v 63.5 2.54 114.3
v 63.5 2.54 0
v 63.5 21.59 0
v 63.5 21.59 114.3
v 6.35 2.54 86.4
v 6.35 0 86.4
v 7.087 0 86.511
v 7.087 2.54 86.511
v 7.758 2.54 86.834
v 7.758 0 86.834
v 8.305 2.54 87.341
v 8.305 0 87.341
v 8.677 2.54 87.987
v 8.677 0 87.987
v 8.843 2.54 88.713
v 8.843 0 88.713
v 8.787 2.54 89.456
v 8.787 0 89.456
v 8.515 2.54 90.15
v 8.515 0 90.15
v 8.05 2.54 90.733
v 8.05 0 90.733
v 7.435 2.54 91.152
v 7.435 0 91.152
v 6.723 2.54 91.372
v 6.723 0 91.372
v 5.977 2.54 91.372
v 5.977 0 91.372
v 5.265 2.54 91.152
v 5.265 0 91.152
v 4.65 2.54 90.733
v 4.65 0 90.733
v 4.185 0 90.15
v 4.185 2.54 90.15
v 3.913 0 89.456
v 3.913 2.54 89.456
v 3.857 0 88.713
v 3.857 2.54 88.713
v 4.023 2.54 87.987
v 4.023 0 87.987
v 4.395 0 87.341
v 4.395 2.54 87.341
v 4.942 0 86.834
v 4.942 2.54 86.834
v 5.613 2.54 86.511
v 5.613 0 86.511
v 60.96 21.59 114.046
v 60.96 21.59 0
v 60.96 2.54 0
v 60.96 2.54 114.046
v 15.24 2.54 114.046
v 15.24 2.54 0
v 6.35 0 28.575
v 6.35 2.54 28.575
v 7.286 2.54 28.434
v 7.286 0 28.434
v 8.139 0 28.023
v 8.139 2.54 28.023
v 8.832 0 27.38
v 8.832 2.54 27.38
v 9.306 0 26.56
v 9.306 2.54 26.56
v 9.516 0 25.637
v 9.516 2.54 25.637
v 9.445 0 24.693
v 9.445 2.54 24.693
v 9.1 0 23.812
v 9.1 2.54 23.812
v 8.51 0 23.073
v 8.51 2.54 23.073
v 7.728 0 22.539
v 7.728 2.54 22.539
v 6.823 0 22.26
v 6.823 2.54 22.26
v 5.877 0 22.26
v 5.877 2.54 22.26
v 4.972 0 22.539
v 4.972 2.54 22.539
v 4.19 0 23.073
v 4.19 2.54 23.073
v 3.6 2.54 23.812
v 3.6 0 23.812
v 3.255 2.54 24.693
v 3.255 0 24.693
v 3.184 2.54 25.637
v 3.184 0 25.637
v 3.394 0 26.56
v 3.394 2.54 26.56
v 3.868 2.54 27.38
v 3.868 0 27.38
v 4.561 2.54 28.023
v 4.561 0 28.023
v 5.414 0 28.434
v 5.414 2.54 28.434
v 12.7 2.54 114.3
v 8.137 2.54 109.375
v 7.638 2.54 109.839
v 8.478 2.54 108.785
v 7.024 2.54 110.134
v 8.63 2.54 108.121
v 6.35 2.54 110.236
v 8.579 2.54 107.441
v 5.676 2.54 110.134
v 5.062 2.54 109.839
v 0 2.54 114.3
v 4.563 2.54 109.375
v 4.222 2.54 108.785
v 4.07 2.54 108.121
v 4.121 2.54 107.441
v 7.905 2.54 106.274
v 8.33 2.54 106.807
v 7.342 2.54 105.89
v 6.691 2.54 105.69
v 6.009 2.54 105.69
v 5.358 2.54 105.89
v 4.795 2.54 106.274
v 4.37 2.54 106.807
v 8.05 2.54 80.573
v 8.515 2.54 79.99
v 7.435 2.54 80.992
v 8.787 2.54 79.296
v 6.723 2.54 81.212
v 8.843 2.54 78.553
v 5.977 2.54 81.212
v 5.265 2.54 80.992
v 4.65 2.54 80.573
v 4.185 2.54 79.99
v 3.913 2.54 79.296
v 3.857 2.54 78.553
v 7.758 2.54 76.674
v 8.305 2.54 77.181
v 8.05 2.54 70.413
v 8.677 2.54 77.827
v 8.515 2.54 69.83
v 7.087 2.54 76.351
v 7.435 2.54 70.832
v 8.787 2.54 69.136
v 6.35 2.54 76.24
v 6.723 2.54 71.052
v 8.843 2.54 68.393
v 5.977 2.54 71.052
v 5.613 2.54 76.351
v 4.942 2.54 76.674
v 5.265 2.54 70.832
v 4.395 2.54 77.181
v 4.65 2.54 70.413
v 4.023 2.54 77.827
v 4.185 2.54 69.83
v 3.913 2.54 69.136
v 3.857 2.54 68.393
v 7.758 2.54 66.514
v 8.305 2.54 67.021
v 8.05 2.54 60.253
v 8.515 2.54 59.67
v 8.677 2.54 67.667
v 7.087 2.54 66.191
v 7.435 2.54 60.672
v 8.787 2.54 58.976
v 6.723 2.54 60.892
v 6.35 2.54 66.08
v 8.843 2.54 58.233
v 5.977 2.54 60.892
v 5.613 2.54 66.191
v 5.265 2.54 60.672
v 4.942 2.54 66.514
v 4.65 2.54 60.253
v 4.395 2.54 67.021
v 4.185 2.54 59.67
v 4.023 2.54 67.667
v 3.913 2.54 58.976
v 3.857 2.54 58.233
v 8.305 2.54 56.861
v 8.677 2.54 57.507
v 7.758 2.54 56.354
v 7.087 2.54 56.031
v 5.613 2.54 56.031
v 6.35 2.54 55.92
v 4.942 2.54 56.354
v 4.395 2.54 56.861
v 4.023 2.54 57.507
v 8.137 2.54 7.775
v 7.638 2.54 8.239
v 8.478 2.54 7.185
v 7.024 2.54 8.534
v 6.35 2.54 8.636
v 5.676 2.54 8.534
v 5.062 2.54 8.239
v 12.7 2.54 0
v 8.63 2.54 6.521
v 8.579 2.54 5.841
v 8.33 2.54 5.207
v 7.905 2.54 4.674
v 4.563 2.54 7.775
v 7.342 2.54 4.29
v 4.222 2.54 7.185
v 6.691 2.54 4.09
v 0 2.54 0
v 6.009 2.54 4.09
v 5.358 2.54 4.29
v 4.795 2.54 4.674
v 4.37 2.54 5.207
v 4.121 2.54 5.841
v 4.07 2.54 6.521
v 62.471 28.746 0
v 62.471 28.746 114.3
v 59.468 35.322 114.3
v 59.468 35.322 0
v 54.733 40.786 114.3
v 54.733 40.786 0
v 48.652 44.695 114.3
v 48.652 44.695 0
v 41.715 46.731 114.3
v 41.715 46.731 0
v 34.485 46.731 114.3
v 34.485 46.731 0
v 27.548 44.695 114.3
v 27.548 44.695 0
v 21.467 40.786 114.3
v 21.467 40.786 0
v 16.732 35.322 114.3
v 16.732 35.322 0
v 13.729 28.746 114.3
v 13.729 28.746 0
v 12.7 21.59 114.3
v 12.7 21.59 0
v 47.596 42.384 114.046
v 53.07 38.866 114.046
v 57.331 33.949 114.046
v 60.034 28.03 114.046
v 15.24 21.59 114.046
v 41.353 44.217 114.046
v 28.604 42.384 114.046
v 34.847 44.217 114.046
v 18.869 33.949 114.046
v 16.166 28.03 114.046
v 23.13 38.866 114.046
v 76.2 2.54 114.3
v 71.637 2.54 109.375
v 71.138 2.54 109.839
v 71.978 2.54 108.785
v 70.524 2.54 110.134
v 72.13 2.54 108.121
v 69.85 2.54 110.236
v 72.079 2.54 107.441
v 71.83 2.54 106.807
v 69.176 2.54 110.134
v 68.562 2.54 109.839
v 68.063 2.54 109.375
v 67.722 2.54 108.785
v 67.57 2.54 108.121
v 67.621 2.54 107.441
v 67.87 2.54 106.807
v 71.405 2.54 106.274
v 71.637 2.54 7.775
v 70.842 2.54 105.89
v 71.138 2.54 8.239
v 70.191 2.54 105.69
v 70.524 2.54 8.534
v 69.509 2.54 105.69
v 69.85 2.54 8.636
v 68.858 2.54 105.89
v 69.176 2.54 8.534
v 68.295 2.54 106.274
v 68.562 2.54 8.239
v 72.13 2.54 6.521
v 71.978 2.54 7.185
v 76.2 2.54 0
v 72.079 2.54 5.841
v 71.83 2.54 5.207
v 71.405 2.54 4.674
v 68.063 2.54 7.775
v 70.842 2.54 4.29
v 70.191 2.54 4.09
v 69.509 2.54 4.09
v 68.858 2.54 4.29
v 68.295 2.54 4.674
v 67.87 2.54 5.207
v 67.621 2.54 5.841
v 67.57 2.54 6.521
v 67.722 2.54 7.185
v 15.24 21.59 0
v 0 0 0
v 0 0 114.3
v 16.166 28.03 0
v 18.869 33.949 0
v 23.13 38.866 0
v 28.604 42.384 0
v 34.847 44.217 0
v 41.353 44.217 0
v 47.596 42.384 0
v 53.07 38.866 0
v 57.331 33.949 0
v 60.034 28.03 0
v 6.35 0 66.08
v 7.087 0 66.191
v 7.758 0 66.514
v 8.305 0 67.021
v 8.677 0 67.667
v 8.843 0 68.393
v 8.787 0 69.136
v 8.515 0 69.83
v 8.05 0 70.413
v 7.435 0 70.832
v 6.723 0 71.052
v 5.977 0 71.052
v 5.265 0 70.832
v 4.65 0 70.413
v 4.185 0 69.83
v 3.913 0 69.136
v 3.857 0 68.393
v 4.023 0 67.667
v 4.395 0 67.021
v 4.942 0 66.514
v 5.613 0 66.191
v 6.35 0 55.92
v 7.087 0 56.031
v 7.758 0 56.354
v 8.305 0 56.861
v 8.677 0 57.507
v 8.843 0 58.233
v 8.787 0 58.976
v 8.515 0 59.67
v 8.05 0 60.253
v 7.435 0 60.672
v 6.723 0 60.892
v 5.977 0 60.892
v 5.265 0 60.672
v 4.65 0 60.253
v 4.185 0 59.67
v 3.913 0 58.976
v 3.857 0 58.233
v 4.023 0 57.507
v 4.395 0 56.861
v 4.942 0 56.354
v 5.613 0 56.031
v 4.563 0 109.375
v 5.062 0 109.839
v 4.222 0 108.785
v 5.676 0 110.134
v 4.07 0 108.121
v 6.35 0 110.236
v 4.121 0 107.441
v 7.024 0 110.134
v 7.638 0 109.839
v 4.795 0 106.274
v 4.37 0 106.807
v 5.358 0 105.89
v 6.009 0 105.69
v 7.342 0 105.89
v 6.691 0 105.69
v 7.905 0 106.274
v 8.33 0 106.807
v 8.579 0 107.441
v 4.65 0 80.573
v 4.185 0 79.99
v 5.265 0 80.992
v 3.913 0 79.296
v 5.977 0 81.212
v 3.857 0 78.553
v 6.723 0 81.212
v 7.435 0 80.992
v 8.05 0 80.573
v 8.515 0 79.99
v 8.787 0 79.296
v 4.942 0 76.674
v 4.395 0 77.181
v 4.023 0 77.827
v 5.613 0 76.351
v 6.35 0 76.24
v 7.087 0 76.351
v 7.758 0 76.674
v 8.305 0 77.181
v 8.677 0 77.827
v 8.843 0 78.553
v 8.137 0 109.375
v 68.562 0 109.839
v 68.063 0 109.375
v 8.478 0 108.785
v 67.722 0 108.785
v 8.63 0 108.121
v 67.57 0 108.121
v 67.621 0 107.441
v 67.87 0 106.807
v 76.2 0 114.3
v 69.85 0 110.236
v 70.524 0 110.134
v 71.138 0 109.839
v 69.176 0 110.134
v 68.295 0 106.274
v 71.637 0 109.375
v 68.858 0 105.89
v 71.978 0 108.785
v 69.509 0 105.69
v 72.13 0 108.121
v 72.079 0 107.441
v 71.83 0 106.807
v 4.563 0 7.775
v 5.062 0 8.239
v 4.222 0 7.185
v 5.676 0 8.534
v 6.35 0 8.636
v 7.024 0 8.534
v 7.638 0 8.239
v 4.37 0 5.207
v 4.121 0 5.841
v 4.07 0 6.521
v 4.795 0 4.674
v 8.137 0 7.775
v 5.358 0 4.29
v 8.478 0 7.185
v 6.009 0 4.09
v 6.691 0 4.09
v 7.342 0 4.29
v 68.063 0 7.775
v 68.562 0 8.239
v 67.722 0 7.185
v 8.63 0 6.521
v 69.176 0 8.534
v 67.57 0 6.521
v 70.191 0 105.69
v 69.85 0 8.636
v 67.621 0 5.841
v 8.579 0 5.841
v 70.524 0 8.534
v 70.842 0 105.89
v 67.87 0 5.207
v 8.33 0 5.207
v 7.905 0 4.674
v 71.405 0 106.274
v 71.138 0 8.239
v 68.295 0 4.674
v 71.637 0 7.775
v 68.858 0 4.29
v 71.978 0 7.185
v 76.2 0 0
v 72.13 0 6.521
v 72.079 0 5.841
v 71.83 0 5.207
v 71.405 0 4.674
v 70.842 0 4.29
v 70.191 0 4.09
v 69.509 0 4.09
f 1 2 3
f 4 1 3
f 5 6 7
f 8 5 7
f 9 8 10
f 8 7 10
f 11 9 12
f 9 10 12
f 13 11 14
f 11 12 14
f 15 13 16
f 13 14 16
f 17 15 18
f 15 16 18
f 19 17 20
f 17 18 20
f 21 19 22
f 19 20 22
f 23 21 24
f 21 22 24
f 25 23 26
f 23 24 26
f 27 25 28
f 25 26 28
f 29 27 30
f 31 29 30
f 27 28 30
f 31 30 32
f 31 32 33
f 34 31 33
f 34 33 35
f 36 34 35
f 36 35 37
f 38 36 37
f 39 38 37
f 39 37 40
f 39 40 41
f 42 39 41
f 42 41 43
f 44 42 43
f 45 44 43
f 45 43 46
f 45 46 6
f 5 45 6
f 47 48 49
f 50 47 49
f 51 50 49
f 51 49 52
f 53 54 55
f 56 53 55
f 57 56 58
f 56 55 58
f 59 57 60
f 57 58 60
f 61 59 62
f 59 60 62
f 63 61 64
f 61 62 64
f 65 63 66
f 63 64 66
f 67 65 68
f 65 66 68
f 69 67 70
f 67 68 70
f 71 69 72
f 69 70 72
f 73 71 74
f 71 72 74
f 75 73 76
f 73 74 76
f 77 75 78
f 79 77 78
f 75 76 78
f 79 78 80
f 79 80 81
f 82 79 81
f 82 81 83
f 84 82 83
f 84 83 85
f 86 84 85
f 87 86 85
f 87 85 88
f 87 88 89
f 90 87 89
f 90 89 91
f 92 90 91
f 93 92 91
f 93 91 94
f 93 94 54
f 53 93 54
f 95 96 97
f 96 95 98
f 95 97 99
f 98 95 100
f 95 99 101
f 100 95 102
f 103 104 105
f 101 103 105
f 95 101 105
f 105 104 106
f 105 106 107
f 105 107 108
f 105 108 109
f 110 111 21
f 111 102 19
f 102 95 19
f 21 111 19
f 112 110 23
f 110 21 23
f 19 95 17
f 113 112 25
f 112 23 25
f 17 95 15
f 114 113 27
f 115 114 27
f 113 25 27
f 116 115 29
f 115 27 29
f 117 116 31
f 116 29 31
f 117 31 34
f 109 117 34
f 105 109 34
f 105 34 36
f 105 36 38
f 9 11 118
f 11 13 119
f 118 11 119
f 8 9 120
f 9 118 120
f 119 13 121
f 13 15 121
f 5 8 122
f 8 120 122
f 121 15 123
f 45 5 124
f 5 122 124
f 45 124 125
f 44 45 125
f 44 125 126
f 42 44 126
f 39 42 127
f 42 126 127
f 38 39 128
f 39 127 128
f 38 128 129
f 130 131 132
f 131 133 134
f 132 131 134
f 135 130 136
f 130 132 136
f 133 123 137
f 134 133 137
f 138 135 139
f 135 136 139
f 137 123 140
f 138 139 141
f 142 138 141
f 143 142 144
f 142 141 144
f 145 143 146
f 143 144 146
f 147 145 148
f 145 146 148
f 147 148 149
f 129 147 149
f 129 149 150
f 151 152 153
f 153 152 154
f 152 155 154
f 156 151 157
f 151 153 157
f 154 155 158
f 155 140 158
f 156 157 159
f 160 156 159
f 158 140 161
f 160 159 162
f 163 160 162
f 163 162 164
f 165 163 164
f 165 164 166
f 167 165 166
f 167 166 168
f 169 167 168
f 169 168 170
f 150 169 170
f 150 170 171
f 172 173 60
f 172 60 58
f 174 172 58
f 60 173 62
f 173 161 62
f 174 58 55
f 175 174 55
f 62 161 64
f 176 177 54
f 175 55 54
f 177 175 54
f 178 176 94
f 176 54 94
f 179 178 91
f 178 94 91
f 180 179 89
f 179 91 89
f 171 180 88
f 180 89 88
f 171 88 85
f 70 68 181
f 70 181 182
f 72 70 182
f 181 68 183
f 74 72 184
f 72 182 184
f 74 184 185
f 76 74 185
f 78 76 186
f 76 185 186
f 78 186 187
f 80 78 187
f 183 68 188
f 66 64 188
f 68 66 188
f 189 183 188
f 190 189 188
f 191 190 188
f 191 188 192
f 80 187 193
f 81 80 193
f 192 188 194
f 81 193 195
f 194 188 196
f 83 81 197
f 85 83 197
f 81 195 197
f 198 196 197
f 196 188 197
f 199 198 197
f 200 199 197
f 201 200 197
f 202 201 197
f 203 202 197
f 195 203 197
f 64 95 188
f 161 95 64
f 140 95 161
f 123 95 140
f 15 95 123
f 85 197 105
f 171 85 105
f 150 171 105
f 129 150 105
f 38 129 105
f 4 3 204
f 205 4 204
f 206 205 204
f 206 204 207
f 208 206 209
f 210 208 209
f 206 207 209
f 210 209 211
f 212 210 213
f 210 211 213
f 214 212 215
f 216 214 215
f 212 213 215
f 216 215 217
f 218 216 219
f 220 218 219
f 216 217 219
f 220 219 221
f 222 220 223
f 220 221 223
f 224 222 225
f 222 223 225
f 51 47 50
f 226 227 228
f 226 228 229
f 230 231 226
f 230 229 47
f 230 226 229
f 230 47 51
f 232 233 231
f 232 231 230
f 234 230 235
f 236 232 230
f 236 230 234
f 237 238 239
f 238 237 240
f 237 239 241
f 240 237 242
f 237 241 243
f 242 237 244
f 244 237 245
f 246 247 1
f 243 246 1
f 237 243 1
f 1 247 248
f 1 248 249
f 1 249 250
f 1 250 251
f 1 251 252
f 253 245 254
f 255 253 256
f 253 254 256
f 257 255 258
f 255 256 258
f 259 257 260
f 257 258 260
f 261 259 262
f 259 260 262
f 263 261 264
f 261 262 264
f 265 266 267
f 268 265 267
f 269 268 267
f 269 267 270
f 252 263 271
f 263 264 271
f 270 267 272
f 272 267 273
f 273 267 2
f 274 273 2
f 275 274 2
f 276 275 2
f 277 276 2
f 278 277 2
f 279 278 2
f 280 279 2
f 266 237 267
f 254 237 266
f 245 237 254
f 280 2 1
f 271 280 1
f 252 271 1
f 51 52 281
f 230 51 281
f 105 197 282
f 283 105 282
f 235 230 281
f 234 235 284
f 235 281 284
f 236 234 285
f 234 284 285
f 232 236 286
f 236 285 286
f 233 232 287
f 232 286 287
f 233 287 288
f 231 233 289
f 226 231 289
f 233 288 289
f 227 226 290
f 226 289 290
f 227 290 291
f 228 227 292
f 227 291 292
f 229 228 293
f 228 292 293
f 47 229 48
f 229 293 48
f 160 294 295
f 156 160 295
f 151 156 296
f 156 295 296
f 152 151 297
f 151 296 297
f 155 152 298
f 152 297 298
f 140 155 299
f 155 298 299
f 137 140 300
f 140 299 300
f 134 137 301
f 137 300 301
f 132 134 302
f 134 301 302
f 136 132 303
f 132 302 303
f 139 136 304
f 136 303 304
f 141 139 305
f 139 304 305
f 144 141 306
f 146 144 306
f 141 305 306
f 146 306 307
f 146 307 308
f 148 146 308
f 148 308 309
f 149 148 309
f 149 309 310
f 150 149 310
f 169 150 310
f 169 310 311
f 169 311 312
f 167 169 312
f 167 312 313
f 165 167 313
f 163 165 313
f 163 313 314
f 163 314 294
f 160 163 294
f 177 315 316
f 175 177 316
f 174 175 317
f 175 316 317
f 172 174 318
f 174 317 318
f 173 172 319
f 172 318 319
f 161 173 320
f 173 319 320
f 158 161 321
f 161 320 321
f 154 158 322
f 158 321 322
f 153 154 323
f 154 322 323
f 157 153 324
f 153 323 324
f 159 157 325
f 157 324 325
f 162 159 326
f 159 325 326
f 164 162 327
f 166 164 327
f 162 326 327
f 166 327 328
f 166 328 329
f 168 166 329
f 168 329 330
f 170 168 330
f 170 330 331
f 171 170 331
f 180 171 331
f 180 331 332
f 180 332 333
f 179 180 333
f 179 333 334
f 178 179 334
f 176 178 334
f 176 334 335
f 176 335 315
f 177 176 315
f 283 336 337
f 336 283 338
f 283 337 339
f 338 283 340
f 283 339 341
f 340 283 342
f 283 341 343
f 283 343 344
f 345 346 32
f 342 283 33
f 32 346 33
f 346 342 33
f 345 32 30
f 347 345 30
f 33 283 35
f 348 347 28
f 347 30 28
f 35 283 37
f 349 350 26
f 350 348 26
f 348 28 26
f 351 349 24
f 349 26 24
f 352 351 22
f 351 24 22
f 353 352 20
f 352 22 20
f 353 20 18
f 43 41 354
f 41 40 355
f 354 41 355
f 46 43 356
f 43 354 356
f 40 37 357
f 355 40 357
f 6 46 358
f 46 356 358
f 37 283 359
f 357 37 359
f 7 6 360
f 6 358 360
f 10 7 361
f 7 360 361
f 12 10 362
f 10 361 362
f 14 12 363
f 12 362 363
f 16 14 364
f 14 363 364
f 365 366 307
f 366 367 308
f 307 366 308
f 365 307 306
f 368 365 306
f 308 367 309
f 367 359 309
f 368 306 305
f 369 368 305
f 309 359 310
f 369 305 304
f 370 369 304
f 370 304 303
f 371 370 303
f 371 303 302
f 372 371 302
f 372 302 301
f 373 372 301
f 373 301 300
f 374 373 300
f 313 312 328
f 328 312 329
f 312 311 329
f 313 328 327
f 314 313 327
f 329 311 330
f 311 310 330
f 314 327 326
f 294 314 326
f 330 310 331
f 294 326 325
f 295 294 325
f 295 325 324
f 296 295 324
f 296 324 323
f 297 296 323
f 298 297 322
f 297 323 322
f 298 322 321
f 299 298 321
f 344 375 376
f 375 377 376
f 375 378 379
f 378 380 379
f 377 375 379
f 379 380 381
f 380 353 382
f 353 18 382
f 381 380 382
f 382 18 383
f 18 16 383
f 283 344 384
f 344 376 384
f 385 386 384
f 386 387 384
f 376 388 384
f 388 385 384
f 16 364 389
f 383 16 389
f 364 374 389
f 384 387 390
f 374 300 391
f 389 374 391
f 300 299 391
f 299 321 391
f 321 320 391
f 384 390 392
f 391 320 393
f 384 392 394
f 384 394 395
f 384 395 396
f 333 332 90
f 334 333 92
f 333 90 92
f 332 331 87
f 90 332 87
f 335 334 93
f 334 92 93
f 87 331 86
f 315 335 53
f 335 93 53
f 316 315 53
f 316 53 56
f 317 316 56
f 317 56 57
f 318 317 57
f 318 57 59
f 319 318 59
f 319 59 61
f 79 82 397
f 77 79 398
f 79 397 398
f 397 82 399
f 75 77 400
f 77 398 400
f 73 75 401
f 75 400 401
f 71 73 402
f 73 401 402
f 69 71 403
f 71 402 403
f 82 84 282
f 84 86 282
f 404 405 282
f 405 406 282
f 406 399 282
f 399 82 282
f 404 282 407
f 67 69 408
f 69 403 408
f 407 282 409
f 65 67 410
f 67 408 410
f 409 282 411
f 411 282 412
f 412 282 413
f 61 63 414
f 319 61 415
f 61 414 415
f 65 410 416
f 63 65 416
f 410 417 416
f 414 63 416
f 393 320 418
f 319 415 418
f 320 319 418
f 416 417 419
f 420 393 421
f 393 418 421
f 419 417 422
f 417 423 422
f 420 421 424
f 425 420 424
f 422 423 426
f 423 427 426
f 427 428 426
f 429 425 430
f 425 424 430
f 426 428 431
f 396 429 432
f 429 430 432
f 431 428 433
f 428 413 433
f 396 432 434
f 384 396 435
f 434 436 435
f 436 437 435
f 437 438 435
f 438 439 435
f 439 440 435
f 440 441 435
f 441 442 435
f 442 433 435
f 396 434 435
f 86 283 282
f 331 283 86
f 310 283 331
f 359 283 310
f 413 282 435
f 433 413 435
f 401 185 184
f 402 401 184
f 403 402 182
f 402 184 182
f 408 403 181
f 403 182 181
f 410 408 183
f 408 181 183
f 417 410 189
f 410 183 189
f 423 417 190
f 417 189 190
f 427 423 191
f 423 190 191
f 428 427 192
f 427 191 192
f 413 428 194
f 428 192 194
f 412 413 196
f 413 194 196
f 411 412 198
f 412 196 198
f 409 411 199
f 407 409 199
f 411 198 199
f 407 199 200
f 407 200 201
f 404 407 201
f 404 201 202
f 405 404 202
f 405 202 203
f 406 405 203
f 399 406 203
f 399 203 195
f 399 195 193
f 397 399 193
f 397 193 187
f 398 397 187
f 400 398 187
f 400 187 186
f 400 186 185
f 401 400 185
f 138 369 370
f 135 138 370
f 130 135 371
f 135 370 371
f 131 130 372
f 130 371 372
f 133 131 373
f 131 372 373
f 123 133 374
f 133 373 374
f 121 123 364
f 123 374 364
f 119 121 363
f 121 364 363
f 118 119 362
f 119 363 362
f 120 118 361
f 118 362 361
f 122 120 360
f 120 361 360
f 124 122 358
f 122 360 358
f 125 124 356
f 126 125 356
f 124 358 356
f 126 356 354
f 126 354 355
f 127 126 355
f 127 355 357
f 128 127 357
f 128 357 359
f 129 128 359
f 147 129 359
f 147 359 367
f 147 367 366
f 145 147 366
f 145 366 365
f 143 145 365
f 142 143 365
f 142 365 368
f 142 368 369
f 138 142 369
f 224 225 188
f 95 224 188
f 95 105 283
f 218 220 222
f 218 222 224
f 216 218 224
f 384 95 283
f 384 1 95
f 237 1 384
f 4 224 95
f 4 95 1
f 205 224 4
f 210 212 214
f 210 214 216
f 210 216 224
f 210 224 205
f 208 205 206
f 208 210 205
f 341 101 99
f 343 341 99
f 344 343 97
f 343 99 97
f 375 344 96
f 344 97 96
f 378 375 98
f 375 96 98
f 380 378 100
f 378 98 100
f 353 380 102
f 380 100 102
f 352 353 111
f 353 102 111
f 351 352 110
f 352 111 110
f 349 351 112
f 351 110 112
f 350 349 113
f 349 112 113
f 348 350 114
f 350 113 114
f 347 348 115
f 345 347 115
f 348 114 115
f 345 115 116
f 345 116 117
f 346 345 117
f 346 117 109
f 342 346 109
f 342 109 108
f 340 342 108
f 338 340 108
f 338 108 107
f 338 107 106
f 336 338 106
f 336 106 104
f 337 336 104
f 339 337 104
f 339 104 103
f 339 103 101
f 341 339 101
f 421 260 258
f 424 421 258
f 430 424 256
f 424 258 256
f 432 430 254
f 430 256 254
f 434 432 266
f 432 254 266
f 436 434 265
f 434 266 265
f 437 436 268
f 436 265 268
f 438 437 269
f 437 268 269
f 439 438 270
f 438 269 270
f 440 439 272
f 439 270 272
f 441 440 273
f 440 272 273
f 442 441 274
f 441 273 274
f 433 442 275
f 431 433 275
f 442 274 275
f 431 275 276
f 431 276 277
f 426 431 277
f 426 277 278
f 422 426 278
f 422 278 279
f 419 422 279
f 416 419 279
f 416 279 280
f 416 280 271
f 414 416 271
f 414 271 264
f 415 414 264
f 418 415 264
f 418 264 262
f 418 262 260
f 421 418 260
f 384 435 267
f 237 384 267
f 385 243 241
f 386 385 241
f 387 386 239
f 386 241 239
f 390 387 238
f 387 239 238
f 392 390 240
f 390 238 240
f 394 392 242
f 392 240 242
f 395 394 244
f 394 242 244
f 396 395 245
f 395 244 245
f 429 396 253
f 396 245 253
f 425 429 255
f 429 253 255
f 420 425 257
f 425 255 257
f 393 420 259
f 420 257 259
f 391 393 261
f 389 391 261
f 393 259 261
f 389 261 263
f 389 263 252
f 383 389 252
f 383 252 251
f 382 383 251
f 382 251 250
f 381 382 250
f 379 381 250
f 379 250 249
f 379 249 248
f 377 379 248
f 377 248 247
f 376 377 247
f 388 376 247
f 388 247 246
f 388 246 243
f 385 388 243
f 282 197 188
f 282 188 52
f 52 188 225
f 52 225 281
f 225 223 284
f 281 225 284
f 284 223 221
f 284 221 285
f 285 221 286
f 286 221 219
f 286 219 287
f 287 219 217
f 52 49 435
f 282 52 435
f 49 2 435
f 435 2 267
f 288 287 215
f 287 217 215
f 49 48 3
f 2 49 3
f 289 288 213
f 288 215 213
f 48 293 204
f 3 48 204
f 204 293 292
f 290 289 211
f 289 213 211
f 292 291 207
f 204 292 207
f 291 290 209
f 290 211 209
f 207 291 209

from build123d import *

# Parameters (mm, degrees)
BOSS_EXTRUDE2_DEPTH = 114.3
SKETCH2_R           = 2.286
CUT_EXTRUDE1_DEPTH  = 145.383975911
CUT_EXTRUDE2_DEPTH  = 114.046
SKETCH5_R           = 2.499999953
CUT_EXTRUDE3_DEPTH  = 146.186053394
SKETCH7_R           = 3.175
CUT_EXTRUDE4_DEPTH  = 145.383975911


with BuildPart() as part:
    # Sketch1 → Boss-Extrude2 (new body)
    with BuildSketch(Plane.XY):
        with BuildLine():
            Line((0, 0), (76.2, 0))
            Line((76.2, 0), (76.2, 2.54))
            Line((76.2, 2.54), (63.5, 2.54))
            Line((63.5, 2.54), (63.5, 21.59))
            ThreePointArc((63.5, 21.59), (38.1, 46.99), (12.7, 21.59))
            Line((12.7, 21.59), (12.7, 2.54))
            Line((12.7, 2.54), (0, 2.54))
            Line((0, 2.54), (0, 0))
        make_face()
    extrude(amount=BOSS_EXTRUDE2_DEPTH)

    # Sketch2 → Cut-Extrude1 (cut, through all)
    with BuildSketch(Plane(origin=(0, 2.54, 0), x_dir=(1, 0, 0), z_dir=(0, 1, 0))):
        with Locations(Location((6.35, -6.35, 0), (0, 0, 270))):
            Circle(SKETCH2_R)
        with Locations(Location((69.85, -6.35, 0), (0, 0, 270))):
            Circle(SKETCH2_R)
        with Locations(Location((69.85, -107.95, 0), (0, 0, 270))):
            Circle(SKETCH2_R)
        with Locations(Location((6.35, -107.95, 0), (0, 0, 270))):
            Circle(SKETCH2_R)
    extrude(amount=-CUT_EXTRUDE1_DEPTH, mode=Mode.SUBTRACT)

    # Sketch4 → Cut-Extrude2 (cut)
    with BuildSketch(Plane(origin=(0, 0, 0), x_dir=(-1, 0, 0), z_dir=(0, 0, -1))):
        with BuildLine():
            Line((-60.96, 2.54), (-15.24, 2.54))
            Line((-15.24, 2.54), (-15.24, 21.59))
            ThreePointArc((-15.24, 21.59), (-38.1, 44.45), (-60.96, 21.59))
            Line((-60.96, 21.59), (-60.96, 2.54))
        make_face()
    extrude(amount=-CUT_EXTRUDE2_DEPTH, mode=Mode.SUBTRACT)

    # Sketch5 → Cut-Extrude3 (cut, through all)
    with BuildSketch(Plane(origin=(0, 0, 0), x_dir=(-1, 0, 0), z_dir=(0, -1, 0))):
        with Locations(Location((-6.35, -88.9, 0), (0, 0, 90))):
            Circle(SKETCH5_R)
        with Locations(Location((-6.35, -78.74, 0), (0, 0, 90))):
            Circle(SKETCH5_R)
        with Locations(Location((-6.35, -68.58, 0), (0, 0, 90))):
            Circle(SKETCH5_R)
        with Locations(Location((-6.35, -58.42, 0), (0, 0, 90))):
            Circle(SKETCH5_R)
    extrude(amount=-CUT_EXTRUDE3_DEPTH, mode=Mode.SUBTRACT)

    # Sketch7 → Cut-Extrude4 (cut, through all)
    with BuildSketch(Plane(origin=(0, 2.54, 0), x_dir=(1, 0, 0), z_dir=(0, 1, 0))):
        with Locations(Location((6.35, -25.4, 0), (0, 0, 270))):
            Circle(SKETCH7_R)
    extrude(amount=-CUT_EXTRUDE4_DEPTH, mode=Mode.SUBTRACT)


solid = part.part
